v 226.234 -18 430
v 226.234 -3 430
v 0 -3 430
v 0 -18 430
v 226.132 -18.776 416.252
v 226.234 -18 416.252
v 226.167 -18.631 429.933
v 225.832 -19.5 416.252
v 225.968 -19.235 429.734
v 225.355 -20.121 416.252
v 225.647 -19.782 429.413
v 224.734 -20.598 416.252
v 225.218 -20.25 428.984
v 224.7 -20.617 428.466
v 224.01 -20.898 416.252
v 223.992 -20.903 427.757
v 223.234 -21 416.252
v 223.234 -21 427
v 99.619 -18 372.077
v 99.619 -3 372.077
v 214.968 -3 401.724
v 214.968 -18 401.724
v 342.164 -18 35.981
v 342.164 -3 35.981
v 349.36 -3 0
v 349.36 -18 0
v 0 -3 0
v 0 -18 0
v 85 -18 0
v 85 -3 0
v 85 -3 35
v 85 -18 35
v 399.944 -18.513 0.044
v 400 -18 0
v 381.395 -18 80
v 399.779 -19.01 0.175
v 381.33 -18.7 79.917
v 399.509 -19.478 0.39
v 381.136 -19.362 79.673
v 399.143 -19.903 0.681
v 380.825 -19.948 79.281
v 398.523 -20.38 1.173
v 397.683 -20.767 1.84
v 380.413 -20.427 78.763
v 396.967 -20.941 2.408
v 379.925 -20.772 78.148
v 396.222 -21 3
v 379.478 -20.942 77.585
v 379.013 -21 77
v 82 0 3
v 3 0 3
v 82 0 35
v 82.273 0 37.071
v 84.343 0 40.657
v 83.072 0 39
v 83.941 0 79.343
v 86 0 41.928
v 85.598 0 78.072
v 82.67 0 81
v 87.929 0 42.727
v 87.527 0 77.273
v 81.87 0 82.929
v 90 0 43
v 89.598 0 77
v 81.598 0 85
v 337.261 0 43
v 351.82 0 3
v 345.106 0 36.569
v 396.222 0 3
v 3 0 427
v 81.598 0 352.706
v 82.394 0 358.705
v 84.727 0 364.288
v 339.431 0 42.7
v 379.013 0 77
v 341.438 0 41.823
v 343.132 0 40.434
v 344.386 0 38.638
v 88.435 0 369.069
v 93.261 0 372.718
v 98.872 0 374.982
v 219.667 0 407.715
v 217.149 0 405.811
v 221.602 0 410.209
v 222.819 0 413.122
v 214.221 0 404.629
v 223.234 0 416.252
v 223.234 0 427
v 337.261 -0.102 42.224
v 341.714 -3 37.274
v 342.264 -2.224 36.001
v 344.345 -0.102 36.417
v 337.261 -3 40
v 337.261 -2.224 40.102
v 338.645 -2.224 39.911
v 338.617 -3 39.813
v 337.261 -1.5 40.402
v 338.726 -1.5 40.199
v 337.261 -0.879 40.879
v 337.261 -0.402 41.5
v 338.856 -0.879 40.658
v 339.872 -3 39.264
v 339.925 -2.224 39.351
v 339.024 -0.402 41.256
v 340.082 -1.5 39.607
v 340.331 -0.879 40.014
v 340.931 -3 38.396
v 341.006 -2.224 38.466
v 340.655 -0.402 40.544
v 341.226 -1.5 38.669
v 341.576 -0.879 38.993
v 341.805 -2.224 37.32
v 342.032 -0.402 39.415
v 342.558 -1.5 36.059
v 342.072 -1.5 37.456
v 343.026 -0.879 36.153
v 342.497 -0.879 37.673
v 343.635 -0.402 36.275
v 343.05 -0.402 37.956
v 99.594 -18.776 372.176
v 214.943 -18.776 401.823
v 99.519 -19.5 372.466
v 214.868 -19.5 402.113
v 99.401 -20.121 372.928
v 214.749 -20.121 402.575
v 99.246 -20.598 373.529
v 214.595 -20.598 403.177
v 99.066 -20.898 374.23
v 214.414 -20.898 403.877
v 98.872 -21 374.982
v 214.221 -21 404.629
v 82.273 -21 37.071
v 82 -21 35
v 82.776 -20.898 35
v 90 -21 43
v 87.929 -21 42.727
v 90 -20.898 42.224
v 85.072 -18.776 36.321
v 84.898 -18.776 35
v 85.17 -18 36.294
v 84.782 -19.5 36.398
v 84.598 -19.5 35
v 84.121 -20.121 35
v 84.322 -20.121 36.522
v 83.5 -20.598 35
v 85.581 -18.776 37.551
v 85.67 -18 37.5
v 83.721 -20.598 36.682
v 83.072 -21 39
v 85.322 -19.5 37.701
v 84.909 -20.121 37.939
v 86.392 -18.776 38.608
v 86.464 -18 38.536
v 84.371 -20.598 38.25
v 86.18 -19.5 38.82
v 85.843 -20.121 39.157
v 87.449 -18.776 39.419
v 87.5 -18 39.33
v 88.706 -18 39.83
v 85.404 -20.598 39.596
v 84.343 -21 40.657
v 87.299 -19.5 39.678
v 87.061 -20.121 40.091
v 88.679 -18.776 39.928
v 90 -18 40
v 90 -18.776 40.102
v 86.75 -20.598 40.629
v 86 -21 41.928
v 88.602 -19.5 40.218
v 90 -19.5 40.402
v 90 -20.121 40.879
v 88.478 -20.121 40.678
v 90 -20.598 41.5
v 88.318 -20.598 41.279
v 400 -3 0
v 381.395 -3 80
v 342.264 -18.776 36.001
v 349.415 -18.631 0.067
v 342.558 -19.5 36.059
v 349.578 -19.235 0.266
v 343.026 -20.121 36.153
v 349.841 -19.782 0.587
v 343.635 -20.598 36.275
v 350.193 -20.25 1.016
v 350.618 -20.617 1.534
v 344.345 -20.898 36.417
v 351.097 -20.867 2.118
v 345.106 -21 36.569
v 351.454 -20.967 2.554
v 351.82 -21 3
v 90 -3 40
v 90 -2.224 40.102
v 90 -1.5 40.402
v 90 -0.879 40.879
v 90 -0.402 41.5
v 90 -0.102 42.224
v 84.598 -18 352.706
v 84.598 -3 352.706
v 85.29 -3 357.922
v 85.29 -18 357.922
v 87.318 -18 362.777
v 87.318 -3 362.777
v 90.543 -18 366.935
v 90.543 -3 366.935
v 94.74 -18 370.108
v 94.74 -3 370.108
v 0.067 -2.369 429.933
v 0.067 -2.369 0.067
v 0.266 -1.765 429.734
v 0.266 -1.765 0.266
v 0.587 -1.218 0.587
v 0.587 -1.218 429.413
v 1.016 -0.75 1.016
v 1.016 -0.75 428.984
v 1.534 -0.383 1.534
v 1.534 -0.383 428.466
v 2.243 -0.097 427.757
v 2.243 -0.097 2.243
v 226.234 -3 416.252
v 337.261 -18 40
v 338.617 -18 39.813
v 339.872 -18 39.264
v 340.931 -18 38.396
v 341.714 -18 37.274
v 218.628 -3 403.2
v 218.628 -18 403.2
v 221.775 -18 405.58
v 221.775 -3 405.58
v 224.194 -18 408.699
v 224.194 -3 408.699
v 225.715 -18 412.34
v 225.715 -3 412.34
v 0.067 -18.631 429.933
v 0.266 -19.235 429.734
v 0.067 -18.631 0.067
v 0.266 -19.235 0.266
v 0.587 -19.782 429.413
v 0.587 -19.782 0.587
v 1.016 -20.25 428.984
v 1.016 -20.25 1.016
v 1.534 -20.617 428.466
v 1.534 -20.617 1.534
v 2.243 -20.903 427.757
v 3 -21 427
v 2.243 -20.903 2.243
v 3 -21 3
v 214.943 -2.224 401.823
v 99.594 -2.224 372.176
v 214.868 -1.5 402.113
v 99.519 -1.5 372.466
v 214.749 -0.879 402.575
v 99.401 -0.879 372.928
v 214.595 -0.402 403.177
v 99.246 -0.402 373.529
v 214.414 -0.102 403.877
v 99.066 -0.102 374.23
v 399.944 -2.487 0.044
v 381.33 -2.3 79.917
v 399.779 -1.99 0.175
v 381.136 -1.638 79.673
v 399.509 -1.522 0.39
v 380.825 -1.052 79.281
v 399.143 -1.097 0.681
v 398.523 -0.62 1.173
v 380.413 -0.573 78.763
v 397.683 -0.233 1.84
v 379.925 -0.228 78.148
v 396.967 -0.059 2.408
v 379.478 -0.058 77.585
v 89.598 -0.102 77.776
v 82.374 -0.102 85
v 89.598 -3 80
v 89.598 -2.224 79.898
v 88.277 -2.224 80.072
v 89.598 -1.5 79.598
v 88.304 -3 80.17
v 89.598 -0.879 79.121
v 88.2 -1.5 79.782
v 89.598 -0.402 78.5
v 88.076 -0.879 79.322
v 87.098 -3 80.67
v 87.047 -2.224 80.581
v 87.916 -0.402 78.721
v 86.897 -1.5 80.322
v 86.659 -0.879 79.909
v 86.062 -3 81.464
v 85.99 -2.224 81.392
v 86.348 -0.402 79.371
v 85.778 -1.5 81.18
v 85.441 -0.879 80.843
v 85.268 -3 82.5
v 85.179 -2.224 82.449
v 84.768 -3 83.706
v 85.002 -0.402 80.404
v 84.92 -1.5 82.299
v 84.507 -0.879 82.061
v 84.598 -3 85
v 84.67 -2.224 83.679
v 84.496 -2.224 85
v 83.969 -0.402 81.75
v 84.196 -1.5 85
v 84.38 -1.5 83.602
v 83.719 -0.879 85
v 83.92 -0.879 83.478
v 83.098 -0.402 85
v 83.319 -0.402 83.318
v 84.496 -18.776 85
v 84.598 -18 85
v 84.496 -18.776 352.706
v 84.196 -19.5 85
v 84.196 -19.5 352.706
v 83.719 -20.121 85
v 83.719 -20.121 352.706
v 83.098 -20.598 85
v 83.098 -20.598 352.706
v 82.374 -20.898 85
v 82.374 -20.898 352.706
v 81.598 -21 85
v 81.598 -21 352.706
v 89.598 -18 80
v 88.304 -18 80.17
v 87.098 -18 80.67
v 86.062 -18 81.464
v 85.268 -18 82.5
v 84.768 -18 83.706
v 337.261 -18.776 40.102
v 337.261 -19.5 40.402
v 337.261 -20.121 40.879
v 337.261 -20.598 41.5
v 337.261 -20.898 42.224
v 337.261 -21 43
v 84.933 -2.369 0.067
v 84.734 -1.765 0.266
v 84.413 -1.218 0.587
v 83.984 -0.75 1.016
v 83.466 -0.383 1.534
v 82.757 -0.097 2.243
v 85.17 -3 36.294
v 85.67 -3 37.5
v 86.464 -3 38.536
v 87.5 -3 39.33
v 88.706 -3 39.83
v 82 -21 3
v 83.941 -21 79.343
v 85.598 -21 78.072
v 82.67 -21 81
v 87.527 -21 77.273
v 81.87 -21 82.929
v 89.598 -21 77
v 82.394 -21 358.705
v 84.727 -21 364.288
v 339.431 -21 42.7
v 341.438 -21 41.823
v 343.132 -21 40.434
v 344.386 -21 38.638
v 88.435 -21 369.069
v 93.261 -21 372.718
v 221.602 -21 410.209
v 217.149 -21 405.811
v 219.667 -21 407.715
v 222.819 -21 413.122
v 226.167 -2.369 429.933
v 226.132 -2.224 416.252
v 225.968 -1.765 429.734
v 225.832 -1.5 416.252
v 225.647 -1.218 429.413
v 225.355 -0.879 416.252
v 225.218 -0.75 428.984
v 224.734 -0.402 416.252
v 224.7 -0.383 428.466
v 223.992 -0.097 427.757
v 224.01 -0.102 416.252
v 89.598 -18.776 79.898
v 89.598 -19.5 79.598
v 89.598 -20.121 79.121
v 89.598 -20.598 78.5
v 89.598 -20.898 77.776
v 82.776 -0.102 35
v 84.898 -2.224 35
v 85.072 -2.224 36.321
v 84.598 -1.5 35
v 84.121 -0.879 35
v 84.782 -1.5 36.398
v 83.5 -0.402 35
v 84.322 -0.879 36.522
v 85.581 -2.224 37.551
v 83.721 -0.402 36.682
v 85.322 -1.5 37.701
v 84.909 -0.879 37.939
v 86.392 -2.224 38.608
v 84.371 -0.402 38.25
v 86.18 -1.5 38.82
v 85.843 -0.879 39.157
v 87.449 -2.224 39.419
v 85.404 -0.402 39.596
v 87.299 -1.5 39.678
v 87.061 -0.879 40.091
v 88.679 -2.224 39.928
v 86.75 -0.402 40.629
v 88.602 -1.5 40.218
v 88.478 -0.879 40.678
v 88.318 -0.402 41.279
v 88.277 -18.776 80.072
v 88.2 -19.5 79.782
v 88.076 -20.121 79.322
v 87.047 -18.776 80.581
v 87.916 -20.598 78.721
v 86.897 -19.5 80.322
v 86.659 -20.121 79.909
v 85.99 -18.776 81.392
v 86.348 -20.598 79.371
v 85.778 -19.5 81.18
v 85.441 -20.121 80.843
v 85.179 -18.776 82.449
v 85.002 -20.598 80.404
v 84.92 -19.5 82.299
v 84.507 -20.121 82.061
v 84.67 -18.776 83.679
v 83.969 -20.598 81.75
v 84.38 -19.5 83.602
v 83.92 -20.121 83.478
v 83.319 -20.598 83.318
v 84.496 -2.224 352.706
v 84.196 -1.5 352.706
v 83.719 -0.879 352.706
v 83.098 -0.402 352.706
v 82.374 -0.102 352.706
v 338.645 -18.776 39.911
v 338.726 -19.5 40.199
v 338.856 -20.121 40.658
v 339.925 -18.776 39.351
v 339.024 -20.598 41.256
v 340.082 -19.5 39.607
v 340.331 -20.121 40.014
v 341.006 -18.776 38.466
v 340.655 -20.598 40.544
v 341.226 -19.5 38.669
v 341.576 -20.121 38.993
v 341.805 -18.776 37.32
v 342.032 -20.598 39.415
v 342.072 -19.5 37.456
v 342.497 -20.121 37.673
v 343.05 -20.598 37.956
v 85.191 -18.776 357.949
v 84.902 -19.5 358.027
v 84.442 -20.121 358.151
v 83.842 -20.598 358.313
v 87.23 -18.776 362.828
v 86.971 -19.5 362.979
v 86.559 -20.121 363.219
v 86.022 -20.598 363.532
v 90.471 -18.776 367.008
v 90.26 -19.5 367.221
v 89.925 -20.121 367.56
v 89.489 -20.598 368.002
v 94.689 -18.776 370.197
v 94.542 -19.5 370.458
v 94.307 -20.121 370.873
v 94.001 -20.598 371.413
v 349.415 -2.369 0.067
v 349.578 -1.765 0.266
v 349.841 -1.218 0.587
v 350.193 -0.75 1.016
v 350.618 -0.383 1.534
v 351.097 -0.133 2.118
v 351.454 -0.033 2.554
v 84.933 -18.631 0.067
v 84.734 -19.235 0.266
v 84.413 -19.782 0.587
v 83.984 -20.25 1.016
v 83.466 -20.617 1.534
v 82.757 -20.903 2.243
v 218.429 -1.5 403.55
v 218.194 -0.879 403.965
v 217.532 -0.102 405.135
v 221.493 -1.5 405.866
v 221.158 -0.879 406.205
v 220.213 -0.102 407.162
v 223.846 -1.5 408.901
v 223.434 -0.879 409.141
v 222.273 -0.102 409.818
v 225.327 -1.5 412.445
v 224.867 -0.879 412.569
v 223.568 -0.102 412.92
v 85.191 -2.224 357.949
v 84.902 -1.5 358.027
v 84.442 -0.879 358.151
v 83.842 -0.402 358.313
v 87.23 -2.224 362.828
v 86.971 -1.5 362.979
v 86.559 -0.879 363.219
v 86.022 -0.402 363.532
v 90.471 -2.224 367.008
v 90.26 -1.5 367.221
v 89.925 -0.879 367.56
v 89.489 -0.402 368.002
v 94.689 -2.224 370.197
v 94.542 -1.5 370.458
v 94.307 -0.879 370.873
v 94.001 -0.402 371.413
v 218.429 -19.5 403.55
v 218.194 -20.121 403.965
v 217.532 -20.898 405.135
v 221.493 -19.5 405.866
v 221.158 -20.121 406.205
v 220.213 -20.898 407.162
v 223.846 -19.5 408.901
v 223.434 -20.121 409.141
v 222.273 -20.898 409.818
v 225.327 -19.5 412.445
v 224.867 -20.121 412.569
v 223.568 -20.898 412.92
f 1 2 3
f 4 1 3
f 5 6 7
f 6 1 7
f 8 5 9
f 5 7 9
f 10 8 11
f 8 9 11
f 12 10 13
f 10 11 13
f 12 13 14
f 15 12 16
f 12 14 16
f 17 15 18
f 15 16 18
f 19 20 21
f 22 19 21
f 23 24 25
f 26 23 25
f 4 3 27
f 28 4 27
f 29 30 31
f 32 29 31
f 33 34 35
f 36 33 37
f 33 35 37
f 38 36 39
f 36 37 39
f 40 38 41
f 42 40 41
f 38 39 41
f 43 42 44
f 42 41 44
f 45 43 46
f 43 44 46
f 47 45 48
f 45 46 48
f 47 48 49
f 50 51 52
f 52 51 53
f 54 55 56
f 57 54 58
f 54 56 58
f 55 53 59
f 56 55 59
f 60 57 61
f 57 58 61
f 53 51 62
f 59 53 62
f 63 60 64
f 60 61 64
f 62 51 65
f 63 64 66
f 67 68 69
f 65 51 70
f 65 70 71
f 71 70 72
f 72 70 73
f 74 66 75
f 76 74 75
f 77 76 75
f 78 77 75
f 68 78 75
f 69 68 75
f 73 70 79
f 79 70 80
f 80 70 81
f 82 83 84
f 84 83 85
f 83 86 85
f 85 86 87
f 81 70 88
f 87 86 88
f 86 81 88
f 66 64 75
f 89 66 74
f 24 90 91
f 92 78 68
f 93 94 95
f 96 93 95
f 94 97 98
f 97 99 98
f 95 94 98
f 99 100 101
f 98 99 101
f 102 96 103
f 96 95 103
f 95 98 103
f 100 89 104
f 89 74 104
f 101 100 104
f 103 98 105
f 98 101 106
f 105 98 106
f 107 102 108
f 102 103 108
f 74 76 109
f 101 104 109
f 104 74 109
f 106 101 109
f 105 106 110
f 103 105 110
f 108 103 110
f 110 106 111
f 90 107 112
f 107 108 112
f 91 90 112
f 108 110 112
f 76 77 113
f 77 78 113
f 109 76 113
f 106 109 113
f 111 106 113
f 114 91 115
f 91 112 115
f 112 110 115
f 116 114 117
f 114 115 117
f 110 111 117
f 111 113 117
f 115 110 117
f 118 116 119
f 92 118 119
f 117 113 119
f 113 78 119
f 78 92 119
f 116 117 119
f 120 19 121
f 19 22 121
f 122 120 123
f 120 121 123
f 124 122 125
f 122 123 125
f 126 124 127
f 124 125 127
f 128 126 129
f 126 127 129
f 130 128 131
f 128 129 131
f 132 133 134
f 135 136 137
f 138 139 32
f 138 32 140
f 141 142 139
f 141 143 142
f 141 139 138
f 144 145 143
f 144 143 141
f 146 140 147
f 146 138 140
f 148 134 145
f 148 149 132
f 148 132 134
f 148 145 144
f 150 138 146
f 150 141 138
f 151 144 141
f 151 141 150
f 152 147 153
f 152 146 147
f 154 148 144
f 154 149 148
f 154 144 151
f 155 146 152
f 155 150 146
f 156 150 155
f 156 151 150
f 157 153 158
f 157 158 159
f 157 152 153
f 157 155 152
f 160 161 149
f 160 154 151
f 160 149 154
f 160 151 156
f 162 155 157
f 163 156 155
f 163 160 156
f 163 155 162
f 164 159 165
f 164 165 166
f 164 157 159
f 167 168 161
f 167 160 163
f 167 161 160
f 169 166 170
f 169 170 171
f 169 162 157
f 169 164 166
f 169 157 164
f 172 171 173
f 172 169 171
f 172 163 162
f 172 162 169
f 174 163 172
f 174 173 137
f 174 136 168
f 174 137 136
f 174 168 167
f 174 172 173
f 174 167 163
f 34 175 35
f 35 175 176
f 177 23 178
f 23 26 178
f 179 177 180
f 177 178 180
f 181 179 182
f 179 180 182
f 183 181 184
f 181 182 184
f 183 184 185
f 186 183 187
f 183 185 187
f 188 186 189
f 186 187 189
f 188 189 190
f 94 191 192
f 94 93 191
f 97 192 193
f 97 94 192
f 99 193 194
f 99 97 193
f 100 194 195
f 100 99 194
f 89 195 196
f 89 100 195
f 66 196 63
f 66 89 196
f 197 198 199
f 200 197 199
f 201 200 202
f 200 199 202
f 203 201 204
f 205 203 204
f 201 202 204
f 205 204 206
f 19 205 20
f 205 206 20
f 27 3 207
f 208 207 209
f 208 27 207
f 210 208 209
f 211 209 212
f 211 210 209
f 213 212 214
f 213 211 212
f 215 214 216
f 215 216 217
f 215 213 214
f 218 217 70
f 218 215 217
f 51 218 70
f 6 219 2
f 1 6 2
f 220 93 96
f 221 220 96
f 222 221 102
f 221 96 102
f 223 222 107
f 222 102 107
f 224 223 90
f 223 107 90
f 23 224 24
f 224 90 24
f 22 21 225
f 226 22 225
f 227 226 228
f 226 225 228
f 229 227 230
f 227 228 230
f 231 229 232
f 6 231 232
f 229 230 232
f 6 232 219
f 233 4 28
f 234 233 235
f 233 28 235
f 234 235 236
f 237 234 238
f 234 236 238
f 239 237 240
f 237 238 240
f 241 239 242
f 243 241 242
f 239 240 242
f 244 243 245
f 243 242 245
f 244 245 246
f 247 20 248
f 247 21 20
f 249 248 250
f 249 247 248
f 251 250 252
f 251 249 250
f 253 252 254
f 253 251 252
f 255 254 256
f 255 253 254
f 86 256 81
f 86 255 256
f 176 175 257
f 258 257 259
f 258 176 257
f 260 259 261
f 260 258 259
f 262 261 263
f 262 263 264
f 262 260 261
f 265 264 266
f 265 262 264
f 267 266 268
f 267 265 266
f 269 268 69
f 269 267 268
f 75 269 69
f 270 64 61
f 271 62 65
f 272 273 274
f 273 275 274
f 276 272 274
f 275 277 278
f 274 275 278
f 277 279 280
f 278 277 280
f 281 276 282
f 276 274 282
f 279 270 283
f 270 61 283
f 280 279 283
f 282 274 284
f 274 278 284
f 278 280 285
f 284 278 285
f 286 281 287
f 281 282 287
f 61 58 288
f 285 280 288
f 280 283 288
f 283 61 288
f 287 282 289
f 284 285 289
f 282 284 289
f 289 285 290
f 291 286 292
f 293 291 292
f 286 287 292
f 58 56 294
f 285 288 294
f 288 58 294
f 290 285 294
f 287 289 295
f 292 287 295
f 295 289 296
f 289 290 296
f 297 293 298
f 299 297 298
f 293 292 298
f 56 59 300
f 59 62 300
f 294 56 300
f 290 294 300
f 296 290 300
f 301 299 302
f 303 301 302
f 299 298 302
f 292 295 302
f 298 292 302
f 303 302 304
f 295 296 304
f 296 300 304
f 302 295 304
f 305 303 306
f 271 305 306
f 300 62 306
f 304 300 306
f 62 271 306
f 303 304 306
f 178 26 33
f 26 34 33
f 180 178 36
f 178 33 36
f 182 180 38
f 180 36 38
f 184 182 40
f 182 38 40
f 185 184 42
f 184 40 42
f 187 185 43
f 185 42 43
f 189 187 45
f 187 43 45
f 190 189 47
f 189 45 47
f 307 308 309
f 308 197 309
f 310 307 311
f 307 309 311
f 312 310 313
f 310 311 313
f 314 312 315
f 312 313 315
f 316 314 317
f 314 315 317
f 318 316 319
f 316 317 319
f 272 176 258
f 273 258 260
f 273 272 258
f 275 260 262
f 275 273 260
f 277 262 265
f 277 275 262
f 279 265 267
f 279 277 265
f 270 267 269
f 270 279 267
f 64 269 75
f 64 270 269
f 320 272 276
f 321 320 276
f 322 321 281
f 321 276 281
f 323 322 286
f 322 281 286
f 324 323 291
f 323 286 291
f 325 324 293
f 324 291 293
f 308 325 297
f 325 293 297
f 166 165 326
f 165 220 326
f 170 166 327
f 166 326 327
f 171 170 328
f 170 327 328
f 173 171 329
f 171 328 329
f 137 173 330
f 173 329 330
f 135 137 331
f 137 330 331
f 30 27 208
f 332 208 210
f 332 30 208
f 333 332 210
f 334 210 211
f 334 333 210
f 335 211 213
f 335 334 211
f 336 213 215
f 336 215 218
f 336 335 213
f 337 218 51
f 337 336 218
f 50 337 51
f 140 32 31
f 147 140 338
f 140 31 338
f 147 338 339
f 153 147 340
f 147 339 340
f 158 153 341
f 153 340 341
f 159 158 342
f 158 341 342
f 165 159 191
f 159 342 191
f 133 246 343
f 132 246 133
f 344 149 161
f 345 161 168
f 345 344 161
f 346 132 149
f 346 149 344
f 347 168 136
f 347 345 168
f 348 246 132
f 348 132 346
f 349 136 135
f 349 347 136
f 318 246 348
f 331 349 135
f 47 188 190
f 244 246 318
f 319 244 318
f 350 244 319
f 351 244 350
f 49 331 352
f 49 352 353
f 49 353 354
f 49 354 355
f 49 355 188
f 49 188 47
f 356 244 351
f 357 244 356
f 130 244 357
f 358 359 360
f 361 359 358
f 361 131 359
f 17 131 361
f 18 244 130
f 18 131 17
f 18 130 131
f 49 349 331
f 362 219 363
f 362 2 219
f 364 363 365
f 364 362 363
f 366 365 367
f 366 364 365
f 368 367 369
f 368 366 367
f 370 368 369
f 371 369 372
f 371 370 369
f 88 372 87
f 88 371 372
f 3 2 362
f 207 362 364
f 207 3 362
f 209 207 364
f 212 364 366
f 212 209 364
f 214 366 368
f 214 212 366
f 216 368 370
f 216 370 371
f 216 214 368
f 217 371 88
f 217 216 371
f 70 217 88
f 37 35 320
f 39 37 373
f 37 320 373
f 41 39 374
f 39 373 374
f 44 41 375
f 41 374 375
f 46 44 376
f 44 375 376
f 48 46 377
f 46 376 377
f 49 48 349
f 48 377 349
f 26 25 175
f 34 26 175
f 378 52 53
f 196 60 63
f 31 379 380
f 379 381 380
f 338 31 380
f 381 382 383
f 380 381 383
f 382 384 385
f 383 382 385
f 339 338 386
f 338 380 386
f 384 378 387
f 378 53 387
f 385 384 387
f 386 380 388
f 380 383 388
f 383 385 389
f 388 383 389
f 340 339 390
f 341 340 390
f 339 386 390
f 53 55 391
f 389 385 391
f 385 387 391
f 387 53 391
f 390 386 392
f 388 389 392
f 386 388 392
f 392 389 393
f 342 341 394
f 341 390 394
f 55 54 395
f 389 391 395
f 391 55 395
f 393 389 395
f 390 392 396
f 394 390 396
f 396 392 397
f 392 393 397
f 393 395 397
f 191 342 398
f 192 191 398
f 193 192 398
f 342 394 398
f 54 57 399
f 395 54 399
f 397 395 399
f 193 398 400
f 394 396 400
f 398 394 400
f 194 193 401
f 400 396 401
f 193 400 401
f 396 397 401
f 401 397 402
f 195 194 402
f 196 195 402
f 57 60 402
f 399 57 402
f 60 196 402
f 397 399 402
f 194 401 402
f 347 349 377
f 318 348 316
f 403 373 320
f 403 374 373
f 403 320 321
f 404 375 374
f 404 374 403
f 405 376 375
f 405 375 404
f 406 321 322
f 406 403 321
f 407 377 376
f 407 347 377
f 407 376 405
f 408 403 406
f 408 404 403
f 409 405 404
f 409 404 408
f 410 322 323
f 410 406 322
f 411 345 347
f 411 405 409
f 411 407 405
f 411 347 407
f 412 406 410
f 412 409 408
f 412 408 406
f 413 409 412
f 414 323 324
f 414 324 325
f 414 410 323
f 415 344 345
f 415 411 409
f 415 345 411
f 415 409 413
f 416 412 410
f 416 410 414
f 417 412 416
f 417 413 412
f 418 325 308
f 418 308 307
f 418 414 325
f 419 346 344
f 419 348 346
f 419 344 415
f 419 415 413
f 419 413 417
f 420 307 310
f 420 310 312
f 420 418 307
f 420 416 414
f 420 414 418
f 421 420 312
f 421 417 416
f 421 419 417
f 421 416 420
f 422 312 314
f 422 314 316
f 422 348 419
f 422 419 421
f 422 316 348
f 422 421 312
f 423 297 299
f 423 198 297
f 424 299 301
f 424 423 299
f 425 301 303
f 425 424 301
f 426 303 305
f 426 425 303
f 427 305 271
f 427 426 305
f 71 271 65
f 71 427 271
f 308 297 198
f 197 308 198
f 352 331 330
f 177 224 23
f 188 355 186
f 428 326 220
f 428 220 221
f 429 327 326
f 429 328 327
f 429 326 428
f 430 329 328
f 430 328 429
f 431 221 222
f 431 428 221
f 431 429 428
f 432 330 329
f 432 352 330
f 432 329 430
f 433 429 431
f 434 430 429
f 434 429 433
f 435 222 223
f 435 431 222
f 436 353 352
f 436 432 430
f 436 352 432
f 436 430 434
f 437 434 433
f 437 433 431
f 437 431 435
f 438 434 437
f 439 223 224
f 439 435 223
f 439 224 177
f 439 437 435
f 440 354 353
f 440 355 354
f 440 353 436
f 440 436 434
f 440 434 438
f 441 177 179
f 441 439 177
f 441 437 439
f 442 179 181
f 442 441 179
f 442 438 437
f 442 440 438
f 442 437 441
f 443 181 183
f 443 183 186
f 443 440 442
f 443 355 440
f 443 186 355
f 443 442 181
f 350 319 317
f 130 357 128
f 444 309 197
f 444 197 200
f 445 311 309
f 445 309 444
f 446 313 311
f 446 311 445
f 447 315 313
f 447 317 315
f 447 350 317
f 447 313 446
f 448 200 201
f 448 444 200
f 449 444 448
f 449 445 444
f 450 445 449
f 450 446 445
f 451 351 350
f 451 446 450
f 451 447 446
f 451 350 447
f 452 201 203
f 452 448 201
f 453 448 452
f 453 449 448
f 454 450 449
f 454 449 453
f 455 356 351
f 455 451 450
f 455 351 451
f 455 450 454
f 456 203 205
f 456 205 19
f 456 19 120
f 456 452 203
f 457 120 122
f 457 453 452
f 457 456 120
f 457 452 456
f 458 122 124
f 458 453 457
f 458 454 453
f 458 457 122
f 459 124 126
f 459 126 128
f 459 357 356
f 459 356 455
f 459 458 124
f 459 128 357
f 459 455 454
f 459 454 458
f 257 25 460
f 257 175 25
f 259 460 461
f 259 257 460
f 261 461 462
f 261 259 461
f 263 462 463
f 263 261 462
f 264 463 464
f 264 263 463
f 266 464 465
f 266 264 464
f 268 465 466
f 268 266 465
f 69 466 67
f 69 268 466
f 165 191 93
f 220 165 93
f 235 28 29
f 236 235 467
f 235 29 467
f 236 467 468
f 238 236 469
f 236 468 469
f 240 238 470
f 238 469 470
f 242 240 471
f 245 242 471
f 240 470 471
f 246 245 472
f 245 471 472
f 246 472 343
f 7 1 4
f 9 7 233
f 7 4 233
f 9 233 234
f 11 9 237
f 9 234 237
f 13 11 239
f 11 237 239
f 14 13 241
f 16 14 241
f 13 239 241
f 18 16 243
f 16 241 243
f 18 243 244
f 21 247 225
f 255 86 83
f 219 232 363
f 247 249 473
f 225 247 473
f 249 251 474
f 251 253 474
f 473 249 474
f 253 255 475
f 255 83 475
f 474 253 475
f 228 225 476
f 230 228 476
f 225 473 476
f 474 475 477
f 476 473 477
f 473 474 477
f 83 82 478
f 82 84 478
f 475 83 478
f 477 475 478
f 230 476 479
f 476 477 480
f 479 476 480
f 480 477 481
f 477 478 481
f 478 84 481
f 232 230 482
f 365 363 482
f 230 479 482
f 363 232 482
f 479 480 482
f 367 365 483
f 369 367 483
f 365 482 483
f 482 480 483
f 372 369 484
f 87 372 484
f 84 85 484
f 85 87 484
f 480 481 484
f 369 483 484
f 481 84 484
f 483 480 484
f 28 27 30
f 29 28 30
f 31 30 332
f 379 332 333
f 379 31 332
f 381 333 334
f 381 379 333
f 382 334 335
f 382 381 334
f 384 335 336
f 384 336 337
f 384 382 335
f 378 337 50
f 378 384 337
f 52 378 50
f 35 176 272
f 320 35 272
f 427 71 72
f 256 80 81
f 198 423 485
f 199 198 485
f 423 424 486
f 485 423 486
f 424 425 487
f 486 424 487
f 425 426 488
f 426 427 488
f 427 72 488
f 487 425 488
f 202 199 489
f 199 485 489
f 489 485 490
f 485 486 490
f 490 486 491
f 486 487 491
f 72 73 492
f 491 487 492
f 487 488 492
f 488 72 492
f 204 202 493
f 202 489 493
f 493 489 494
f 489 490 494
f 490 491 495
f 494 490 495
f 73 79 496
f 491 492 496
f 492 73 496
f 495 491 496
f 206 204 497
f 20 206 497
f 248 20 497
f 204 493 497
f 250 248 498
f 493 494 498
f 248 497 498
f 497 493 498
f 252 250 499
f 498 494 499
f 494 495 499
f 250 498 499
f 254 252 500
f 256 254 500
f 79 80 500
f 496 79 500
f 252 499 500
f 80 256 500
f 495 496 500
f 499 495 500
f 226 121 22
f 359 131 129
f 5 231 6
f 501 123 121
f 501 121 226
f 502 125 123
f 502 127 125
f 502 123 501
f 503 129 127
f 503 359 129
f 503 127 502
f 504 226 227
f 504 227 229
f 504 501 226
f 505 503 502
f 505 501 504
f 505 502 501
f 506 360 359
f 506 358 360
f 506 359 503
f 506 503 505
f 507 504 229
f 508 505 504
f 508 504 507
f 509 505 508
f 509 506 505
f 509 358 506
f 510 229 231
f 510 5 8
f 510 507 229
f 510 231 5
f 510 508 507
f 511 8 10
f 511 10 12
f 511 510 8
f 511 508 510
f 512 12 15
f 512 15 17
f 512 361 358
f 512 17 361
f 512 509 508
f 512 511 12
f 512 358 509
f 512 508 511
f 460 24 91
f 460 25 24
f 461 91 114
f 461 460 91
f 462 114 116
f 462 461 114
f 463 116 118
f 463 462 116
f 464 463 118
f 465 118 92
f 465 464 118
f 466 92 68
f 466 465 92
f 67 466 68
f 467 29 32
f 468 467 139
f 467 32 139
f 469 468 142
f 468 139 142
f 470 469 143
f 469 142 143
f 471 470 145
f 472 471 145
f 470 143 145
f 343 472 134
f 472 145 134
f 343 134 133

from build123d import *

# Parameters (mm, degrees)
F1_DEPTH = 21
F2_R     = 3


with BuildPart() as f1:
    # F0 (on Front) → F1 (new body)
    with BuildSketch(Plane.XZ):
        with BuildLine():
            Line((400, 0), (381.3953488372, 80))
            Line((381.3953488372, 80), (89.5979005098, 80))
            ThreePointArc((89.5979005098, 80), (86.0623666039, 81.4644660941), (84.5979005098, 85))
            Line((84.5979005098, 85), (84.5979005098, 352.7062674352))
            ThreePointArc((84.5979005098, 352.7062674352), (88.7932713354, 364.9624371736), (99.6192701756, 372.0766892167))
            Line((99.6192701756, 372.0766892167), (214.9680088476, 401.7238871894))
            ThreePointArc((214.9680088476, 401.7238871894), (223.0875079778, 407.0595762217), (226.2340360969, 416.2517035256))
            Line((226.2340360969, 416.2517035256), (226.2340360969, 430))
            Line((226.2340360969, 430), (0, 430))
            Line((0, 430), (0, 0))
            Line((0, 0), (85, 0))
            Line((85, 0), (85, 35))
            ThreePointArc((85, 35), (86.4644660941, 38.5355339059), (90, 40))
            Line((90, 40), (337.2612395977, 40))
            ThreePointArc((337.2612395977, 40), (340.4311835928, 38.8667111436), (342.1641427058, 35.9805820273))
            Line((342.1641427058, 35.9805820273), (349.360269427, 0))
            Line((349.360269427, 0), (400, 0))
        make_face()
    extrude(amount=F1_DEPTH)

    # F2
    f2_edges = [f1.edges().sort_by_distance(p)[0] for p in [
        (226.234036, -21, 423.125852),
        (113.117018, -21, 430),
        (0, -21, 215),
        (42.5, -21, 0),
        (85, -21, 17.5),
        (86.464466, -21, 38.535534),
        (213.63062, -21, 40),
        (340.431184, -21, 38.866711),
        (345.762206, -21, 17.990291),
        (374.680135, -21, 0),
        (390.697674, -21, 40),
        (235.496625, -21, 80),
        (86.062367, -21, 81.464466),
        (84.597901, -21, 218.853134),
        (88.793271, -21, 364.962437),
        (157.29364, -21, 386.900288),
        (223.087508, -21, 407.059576),
        (226.234036, 0, 423.125852),
        (113.117018, 0, 430),
        (0, 0, 215),
        (42.5, 0, 0),
        (85, 0, 17.5),
        (86.464466, 0, 38.535534),
        (213.63062, 0, 40),
        (340.431184, 0, 38.866711),
        (345.762206, 0, 17.990291),
        (374.680135, 0, 0),
        (390.697674, 0, 40),
        (235.496625, 0, 80),
        (86.062367, 0, 81.464466),
        (84.597901, 0, 218.853134),
        (88.793271, 0, 364.962437),
        (157.29364, 0, 386.900288),
        (223.087508, 0, 407.059576),
    ]]
    fillet(f2_edges, radius=F2_R)


solid = f1.part
